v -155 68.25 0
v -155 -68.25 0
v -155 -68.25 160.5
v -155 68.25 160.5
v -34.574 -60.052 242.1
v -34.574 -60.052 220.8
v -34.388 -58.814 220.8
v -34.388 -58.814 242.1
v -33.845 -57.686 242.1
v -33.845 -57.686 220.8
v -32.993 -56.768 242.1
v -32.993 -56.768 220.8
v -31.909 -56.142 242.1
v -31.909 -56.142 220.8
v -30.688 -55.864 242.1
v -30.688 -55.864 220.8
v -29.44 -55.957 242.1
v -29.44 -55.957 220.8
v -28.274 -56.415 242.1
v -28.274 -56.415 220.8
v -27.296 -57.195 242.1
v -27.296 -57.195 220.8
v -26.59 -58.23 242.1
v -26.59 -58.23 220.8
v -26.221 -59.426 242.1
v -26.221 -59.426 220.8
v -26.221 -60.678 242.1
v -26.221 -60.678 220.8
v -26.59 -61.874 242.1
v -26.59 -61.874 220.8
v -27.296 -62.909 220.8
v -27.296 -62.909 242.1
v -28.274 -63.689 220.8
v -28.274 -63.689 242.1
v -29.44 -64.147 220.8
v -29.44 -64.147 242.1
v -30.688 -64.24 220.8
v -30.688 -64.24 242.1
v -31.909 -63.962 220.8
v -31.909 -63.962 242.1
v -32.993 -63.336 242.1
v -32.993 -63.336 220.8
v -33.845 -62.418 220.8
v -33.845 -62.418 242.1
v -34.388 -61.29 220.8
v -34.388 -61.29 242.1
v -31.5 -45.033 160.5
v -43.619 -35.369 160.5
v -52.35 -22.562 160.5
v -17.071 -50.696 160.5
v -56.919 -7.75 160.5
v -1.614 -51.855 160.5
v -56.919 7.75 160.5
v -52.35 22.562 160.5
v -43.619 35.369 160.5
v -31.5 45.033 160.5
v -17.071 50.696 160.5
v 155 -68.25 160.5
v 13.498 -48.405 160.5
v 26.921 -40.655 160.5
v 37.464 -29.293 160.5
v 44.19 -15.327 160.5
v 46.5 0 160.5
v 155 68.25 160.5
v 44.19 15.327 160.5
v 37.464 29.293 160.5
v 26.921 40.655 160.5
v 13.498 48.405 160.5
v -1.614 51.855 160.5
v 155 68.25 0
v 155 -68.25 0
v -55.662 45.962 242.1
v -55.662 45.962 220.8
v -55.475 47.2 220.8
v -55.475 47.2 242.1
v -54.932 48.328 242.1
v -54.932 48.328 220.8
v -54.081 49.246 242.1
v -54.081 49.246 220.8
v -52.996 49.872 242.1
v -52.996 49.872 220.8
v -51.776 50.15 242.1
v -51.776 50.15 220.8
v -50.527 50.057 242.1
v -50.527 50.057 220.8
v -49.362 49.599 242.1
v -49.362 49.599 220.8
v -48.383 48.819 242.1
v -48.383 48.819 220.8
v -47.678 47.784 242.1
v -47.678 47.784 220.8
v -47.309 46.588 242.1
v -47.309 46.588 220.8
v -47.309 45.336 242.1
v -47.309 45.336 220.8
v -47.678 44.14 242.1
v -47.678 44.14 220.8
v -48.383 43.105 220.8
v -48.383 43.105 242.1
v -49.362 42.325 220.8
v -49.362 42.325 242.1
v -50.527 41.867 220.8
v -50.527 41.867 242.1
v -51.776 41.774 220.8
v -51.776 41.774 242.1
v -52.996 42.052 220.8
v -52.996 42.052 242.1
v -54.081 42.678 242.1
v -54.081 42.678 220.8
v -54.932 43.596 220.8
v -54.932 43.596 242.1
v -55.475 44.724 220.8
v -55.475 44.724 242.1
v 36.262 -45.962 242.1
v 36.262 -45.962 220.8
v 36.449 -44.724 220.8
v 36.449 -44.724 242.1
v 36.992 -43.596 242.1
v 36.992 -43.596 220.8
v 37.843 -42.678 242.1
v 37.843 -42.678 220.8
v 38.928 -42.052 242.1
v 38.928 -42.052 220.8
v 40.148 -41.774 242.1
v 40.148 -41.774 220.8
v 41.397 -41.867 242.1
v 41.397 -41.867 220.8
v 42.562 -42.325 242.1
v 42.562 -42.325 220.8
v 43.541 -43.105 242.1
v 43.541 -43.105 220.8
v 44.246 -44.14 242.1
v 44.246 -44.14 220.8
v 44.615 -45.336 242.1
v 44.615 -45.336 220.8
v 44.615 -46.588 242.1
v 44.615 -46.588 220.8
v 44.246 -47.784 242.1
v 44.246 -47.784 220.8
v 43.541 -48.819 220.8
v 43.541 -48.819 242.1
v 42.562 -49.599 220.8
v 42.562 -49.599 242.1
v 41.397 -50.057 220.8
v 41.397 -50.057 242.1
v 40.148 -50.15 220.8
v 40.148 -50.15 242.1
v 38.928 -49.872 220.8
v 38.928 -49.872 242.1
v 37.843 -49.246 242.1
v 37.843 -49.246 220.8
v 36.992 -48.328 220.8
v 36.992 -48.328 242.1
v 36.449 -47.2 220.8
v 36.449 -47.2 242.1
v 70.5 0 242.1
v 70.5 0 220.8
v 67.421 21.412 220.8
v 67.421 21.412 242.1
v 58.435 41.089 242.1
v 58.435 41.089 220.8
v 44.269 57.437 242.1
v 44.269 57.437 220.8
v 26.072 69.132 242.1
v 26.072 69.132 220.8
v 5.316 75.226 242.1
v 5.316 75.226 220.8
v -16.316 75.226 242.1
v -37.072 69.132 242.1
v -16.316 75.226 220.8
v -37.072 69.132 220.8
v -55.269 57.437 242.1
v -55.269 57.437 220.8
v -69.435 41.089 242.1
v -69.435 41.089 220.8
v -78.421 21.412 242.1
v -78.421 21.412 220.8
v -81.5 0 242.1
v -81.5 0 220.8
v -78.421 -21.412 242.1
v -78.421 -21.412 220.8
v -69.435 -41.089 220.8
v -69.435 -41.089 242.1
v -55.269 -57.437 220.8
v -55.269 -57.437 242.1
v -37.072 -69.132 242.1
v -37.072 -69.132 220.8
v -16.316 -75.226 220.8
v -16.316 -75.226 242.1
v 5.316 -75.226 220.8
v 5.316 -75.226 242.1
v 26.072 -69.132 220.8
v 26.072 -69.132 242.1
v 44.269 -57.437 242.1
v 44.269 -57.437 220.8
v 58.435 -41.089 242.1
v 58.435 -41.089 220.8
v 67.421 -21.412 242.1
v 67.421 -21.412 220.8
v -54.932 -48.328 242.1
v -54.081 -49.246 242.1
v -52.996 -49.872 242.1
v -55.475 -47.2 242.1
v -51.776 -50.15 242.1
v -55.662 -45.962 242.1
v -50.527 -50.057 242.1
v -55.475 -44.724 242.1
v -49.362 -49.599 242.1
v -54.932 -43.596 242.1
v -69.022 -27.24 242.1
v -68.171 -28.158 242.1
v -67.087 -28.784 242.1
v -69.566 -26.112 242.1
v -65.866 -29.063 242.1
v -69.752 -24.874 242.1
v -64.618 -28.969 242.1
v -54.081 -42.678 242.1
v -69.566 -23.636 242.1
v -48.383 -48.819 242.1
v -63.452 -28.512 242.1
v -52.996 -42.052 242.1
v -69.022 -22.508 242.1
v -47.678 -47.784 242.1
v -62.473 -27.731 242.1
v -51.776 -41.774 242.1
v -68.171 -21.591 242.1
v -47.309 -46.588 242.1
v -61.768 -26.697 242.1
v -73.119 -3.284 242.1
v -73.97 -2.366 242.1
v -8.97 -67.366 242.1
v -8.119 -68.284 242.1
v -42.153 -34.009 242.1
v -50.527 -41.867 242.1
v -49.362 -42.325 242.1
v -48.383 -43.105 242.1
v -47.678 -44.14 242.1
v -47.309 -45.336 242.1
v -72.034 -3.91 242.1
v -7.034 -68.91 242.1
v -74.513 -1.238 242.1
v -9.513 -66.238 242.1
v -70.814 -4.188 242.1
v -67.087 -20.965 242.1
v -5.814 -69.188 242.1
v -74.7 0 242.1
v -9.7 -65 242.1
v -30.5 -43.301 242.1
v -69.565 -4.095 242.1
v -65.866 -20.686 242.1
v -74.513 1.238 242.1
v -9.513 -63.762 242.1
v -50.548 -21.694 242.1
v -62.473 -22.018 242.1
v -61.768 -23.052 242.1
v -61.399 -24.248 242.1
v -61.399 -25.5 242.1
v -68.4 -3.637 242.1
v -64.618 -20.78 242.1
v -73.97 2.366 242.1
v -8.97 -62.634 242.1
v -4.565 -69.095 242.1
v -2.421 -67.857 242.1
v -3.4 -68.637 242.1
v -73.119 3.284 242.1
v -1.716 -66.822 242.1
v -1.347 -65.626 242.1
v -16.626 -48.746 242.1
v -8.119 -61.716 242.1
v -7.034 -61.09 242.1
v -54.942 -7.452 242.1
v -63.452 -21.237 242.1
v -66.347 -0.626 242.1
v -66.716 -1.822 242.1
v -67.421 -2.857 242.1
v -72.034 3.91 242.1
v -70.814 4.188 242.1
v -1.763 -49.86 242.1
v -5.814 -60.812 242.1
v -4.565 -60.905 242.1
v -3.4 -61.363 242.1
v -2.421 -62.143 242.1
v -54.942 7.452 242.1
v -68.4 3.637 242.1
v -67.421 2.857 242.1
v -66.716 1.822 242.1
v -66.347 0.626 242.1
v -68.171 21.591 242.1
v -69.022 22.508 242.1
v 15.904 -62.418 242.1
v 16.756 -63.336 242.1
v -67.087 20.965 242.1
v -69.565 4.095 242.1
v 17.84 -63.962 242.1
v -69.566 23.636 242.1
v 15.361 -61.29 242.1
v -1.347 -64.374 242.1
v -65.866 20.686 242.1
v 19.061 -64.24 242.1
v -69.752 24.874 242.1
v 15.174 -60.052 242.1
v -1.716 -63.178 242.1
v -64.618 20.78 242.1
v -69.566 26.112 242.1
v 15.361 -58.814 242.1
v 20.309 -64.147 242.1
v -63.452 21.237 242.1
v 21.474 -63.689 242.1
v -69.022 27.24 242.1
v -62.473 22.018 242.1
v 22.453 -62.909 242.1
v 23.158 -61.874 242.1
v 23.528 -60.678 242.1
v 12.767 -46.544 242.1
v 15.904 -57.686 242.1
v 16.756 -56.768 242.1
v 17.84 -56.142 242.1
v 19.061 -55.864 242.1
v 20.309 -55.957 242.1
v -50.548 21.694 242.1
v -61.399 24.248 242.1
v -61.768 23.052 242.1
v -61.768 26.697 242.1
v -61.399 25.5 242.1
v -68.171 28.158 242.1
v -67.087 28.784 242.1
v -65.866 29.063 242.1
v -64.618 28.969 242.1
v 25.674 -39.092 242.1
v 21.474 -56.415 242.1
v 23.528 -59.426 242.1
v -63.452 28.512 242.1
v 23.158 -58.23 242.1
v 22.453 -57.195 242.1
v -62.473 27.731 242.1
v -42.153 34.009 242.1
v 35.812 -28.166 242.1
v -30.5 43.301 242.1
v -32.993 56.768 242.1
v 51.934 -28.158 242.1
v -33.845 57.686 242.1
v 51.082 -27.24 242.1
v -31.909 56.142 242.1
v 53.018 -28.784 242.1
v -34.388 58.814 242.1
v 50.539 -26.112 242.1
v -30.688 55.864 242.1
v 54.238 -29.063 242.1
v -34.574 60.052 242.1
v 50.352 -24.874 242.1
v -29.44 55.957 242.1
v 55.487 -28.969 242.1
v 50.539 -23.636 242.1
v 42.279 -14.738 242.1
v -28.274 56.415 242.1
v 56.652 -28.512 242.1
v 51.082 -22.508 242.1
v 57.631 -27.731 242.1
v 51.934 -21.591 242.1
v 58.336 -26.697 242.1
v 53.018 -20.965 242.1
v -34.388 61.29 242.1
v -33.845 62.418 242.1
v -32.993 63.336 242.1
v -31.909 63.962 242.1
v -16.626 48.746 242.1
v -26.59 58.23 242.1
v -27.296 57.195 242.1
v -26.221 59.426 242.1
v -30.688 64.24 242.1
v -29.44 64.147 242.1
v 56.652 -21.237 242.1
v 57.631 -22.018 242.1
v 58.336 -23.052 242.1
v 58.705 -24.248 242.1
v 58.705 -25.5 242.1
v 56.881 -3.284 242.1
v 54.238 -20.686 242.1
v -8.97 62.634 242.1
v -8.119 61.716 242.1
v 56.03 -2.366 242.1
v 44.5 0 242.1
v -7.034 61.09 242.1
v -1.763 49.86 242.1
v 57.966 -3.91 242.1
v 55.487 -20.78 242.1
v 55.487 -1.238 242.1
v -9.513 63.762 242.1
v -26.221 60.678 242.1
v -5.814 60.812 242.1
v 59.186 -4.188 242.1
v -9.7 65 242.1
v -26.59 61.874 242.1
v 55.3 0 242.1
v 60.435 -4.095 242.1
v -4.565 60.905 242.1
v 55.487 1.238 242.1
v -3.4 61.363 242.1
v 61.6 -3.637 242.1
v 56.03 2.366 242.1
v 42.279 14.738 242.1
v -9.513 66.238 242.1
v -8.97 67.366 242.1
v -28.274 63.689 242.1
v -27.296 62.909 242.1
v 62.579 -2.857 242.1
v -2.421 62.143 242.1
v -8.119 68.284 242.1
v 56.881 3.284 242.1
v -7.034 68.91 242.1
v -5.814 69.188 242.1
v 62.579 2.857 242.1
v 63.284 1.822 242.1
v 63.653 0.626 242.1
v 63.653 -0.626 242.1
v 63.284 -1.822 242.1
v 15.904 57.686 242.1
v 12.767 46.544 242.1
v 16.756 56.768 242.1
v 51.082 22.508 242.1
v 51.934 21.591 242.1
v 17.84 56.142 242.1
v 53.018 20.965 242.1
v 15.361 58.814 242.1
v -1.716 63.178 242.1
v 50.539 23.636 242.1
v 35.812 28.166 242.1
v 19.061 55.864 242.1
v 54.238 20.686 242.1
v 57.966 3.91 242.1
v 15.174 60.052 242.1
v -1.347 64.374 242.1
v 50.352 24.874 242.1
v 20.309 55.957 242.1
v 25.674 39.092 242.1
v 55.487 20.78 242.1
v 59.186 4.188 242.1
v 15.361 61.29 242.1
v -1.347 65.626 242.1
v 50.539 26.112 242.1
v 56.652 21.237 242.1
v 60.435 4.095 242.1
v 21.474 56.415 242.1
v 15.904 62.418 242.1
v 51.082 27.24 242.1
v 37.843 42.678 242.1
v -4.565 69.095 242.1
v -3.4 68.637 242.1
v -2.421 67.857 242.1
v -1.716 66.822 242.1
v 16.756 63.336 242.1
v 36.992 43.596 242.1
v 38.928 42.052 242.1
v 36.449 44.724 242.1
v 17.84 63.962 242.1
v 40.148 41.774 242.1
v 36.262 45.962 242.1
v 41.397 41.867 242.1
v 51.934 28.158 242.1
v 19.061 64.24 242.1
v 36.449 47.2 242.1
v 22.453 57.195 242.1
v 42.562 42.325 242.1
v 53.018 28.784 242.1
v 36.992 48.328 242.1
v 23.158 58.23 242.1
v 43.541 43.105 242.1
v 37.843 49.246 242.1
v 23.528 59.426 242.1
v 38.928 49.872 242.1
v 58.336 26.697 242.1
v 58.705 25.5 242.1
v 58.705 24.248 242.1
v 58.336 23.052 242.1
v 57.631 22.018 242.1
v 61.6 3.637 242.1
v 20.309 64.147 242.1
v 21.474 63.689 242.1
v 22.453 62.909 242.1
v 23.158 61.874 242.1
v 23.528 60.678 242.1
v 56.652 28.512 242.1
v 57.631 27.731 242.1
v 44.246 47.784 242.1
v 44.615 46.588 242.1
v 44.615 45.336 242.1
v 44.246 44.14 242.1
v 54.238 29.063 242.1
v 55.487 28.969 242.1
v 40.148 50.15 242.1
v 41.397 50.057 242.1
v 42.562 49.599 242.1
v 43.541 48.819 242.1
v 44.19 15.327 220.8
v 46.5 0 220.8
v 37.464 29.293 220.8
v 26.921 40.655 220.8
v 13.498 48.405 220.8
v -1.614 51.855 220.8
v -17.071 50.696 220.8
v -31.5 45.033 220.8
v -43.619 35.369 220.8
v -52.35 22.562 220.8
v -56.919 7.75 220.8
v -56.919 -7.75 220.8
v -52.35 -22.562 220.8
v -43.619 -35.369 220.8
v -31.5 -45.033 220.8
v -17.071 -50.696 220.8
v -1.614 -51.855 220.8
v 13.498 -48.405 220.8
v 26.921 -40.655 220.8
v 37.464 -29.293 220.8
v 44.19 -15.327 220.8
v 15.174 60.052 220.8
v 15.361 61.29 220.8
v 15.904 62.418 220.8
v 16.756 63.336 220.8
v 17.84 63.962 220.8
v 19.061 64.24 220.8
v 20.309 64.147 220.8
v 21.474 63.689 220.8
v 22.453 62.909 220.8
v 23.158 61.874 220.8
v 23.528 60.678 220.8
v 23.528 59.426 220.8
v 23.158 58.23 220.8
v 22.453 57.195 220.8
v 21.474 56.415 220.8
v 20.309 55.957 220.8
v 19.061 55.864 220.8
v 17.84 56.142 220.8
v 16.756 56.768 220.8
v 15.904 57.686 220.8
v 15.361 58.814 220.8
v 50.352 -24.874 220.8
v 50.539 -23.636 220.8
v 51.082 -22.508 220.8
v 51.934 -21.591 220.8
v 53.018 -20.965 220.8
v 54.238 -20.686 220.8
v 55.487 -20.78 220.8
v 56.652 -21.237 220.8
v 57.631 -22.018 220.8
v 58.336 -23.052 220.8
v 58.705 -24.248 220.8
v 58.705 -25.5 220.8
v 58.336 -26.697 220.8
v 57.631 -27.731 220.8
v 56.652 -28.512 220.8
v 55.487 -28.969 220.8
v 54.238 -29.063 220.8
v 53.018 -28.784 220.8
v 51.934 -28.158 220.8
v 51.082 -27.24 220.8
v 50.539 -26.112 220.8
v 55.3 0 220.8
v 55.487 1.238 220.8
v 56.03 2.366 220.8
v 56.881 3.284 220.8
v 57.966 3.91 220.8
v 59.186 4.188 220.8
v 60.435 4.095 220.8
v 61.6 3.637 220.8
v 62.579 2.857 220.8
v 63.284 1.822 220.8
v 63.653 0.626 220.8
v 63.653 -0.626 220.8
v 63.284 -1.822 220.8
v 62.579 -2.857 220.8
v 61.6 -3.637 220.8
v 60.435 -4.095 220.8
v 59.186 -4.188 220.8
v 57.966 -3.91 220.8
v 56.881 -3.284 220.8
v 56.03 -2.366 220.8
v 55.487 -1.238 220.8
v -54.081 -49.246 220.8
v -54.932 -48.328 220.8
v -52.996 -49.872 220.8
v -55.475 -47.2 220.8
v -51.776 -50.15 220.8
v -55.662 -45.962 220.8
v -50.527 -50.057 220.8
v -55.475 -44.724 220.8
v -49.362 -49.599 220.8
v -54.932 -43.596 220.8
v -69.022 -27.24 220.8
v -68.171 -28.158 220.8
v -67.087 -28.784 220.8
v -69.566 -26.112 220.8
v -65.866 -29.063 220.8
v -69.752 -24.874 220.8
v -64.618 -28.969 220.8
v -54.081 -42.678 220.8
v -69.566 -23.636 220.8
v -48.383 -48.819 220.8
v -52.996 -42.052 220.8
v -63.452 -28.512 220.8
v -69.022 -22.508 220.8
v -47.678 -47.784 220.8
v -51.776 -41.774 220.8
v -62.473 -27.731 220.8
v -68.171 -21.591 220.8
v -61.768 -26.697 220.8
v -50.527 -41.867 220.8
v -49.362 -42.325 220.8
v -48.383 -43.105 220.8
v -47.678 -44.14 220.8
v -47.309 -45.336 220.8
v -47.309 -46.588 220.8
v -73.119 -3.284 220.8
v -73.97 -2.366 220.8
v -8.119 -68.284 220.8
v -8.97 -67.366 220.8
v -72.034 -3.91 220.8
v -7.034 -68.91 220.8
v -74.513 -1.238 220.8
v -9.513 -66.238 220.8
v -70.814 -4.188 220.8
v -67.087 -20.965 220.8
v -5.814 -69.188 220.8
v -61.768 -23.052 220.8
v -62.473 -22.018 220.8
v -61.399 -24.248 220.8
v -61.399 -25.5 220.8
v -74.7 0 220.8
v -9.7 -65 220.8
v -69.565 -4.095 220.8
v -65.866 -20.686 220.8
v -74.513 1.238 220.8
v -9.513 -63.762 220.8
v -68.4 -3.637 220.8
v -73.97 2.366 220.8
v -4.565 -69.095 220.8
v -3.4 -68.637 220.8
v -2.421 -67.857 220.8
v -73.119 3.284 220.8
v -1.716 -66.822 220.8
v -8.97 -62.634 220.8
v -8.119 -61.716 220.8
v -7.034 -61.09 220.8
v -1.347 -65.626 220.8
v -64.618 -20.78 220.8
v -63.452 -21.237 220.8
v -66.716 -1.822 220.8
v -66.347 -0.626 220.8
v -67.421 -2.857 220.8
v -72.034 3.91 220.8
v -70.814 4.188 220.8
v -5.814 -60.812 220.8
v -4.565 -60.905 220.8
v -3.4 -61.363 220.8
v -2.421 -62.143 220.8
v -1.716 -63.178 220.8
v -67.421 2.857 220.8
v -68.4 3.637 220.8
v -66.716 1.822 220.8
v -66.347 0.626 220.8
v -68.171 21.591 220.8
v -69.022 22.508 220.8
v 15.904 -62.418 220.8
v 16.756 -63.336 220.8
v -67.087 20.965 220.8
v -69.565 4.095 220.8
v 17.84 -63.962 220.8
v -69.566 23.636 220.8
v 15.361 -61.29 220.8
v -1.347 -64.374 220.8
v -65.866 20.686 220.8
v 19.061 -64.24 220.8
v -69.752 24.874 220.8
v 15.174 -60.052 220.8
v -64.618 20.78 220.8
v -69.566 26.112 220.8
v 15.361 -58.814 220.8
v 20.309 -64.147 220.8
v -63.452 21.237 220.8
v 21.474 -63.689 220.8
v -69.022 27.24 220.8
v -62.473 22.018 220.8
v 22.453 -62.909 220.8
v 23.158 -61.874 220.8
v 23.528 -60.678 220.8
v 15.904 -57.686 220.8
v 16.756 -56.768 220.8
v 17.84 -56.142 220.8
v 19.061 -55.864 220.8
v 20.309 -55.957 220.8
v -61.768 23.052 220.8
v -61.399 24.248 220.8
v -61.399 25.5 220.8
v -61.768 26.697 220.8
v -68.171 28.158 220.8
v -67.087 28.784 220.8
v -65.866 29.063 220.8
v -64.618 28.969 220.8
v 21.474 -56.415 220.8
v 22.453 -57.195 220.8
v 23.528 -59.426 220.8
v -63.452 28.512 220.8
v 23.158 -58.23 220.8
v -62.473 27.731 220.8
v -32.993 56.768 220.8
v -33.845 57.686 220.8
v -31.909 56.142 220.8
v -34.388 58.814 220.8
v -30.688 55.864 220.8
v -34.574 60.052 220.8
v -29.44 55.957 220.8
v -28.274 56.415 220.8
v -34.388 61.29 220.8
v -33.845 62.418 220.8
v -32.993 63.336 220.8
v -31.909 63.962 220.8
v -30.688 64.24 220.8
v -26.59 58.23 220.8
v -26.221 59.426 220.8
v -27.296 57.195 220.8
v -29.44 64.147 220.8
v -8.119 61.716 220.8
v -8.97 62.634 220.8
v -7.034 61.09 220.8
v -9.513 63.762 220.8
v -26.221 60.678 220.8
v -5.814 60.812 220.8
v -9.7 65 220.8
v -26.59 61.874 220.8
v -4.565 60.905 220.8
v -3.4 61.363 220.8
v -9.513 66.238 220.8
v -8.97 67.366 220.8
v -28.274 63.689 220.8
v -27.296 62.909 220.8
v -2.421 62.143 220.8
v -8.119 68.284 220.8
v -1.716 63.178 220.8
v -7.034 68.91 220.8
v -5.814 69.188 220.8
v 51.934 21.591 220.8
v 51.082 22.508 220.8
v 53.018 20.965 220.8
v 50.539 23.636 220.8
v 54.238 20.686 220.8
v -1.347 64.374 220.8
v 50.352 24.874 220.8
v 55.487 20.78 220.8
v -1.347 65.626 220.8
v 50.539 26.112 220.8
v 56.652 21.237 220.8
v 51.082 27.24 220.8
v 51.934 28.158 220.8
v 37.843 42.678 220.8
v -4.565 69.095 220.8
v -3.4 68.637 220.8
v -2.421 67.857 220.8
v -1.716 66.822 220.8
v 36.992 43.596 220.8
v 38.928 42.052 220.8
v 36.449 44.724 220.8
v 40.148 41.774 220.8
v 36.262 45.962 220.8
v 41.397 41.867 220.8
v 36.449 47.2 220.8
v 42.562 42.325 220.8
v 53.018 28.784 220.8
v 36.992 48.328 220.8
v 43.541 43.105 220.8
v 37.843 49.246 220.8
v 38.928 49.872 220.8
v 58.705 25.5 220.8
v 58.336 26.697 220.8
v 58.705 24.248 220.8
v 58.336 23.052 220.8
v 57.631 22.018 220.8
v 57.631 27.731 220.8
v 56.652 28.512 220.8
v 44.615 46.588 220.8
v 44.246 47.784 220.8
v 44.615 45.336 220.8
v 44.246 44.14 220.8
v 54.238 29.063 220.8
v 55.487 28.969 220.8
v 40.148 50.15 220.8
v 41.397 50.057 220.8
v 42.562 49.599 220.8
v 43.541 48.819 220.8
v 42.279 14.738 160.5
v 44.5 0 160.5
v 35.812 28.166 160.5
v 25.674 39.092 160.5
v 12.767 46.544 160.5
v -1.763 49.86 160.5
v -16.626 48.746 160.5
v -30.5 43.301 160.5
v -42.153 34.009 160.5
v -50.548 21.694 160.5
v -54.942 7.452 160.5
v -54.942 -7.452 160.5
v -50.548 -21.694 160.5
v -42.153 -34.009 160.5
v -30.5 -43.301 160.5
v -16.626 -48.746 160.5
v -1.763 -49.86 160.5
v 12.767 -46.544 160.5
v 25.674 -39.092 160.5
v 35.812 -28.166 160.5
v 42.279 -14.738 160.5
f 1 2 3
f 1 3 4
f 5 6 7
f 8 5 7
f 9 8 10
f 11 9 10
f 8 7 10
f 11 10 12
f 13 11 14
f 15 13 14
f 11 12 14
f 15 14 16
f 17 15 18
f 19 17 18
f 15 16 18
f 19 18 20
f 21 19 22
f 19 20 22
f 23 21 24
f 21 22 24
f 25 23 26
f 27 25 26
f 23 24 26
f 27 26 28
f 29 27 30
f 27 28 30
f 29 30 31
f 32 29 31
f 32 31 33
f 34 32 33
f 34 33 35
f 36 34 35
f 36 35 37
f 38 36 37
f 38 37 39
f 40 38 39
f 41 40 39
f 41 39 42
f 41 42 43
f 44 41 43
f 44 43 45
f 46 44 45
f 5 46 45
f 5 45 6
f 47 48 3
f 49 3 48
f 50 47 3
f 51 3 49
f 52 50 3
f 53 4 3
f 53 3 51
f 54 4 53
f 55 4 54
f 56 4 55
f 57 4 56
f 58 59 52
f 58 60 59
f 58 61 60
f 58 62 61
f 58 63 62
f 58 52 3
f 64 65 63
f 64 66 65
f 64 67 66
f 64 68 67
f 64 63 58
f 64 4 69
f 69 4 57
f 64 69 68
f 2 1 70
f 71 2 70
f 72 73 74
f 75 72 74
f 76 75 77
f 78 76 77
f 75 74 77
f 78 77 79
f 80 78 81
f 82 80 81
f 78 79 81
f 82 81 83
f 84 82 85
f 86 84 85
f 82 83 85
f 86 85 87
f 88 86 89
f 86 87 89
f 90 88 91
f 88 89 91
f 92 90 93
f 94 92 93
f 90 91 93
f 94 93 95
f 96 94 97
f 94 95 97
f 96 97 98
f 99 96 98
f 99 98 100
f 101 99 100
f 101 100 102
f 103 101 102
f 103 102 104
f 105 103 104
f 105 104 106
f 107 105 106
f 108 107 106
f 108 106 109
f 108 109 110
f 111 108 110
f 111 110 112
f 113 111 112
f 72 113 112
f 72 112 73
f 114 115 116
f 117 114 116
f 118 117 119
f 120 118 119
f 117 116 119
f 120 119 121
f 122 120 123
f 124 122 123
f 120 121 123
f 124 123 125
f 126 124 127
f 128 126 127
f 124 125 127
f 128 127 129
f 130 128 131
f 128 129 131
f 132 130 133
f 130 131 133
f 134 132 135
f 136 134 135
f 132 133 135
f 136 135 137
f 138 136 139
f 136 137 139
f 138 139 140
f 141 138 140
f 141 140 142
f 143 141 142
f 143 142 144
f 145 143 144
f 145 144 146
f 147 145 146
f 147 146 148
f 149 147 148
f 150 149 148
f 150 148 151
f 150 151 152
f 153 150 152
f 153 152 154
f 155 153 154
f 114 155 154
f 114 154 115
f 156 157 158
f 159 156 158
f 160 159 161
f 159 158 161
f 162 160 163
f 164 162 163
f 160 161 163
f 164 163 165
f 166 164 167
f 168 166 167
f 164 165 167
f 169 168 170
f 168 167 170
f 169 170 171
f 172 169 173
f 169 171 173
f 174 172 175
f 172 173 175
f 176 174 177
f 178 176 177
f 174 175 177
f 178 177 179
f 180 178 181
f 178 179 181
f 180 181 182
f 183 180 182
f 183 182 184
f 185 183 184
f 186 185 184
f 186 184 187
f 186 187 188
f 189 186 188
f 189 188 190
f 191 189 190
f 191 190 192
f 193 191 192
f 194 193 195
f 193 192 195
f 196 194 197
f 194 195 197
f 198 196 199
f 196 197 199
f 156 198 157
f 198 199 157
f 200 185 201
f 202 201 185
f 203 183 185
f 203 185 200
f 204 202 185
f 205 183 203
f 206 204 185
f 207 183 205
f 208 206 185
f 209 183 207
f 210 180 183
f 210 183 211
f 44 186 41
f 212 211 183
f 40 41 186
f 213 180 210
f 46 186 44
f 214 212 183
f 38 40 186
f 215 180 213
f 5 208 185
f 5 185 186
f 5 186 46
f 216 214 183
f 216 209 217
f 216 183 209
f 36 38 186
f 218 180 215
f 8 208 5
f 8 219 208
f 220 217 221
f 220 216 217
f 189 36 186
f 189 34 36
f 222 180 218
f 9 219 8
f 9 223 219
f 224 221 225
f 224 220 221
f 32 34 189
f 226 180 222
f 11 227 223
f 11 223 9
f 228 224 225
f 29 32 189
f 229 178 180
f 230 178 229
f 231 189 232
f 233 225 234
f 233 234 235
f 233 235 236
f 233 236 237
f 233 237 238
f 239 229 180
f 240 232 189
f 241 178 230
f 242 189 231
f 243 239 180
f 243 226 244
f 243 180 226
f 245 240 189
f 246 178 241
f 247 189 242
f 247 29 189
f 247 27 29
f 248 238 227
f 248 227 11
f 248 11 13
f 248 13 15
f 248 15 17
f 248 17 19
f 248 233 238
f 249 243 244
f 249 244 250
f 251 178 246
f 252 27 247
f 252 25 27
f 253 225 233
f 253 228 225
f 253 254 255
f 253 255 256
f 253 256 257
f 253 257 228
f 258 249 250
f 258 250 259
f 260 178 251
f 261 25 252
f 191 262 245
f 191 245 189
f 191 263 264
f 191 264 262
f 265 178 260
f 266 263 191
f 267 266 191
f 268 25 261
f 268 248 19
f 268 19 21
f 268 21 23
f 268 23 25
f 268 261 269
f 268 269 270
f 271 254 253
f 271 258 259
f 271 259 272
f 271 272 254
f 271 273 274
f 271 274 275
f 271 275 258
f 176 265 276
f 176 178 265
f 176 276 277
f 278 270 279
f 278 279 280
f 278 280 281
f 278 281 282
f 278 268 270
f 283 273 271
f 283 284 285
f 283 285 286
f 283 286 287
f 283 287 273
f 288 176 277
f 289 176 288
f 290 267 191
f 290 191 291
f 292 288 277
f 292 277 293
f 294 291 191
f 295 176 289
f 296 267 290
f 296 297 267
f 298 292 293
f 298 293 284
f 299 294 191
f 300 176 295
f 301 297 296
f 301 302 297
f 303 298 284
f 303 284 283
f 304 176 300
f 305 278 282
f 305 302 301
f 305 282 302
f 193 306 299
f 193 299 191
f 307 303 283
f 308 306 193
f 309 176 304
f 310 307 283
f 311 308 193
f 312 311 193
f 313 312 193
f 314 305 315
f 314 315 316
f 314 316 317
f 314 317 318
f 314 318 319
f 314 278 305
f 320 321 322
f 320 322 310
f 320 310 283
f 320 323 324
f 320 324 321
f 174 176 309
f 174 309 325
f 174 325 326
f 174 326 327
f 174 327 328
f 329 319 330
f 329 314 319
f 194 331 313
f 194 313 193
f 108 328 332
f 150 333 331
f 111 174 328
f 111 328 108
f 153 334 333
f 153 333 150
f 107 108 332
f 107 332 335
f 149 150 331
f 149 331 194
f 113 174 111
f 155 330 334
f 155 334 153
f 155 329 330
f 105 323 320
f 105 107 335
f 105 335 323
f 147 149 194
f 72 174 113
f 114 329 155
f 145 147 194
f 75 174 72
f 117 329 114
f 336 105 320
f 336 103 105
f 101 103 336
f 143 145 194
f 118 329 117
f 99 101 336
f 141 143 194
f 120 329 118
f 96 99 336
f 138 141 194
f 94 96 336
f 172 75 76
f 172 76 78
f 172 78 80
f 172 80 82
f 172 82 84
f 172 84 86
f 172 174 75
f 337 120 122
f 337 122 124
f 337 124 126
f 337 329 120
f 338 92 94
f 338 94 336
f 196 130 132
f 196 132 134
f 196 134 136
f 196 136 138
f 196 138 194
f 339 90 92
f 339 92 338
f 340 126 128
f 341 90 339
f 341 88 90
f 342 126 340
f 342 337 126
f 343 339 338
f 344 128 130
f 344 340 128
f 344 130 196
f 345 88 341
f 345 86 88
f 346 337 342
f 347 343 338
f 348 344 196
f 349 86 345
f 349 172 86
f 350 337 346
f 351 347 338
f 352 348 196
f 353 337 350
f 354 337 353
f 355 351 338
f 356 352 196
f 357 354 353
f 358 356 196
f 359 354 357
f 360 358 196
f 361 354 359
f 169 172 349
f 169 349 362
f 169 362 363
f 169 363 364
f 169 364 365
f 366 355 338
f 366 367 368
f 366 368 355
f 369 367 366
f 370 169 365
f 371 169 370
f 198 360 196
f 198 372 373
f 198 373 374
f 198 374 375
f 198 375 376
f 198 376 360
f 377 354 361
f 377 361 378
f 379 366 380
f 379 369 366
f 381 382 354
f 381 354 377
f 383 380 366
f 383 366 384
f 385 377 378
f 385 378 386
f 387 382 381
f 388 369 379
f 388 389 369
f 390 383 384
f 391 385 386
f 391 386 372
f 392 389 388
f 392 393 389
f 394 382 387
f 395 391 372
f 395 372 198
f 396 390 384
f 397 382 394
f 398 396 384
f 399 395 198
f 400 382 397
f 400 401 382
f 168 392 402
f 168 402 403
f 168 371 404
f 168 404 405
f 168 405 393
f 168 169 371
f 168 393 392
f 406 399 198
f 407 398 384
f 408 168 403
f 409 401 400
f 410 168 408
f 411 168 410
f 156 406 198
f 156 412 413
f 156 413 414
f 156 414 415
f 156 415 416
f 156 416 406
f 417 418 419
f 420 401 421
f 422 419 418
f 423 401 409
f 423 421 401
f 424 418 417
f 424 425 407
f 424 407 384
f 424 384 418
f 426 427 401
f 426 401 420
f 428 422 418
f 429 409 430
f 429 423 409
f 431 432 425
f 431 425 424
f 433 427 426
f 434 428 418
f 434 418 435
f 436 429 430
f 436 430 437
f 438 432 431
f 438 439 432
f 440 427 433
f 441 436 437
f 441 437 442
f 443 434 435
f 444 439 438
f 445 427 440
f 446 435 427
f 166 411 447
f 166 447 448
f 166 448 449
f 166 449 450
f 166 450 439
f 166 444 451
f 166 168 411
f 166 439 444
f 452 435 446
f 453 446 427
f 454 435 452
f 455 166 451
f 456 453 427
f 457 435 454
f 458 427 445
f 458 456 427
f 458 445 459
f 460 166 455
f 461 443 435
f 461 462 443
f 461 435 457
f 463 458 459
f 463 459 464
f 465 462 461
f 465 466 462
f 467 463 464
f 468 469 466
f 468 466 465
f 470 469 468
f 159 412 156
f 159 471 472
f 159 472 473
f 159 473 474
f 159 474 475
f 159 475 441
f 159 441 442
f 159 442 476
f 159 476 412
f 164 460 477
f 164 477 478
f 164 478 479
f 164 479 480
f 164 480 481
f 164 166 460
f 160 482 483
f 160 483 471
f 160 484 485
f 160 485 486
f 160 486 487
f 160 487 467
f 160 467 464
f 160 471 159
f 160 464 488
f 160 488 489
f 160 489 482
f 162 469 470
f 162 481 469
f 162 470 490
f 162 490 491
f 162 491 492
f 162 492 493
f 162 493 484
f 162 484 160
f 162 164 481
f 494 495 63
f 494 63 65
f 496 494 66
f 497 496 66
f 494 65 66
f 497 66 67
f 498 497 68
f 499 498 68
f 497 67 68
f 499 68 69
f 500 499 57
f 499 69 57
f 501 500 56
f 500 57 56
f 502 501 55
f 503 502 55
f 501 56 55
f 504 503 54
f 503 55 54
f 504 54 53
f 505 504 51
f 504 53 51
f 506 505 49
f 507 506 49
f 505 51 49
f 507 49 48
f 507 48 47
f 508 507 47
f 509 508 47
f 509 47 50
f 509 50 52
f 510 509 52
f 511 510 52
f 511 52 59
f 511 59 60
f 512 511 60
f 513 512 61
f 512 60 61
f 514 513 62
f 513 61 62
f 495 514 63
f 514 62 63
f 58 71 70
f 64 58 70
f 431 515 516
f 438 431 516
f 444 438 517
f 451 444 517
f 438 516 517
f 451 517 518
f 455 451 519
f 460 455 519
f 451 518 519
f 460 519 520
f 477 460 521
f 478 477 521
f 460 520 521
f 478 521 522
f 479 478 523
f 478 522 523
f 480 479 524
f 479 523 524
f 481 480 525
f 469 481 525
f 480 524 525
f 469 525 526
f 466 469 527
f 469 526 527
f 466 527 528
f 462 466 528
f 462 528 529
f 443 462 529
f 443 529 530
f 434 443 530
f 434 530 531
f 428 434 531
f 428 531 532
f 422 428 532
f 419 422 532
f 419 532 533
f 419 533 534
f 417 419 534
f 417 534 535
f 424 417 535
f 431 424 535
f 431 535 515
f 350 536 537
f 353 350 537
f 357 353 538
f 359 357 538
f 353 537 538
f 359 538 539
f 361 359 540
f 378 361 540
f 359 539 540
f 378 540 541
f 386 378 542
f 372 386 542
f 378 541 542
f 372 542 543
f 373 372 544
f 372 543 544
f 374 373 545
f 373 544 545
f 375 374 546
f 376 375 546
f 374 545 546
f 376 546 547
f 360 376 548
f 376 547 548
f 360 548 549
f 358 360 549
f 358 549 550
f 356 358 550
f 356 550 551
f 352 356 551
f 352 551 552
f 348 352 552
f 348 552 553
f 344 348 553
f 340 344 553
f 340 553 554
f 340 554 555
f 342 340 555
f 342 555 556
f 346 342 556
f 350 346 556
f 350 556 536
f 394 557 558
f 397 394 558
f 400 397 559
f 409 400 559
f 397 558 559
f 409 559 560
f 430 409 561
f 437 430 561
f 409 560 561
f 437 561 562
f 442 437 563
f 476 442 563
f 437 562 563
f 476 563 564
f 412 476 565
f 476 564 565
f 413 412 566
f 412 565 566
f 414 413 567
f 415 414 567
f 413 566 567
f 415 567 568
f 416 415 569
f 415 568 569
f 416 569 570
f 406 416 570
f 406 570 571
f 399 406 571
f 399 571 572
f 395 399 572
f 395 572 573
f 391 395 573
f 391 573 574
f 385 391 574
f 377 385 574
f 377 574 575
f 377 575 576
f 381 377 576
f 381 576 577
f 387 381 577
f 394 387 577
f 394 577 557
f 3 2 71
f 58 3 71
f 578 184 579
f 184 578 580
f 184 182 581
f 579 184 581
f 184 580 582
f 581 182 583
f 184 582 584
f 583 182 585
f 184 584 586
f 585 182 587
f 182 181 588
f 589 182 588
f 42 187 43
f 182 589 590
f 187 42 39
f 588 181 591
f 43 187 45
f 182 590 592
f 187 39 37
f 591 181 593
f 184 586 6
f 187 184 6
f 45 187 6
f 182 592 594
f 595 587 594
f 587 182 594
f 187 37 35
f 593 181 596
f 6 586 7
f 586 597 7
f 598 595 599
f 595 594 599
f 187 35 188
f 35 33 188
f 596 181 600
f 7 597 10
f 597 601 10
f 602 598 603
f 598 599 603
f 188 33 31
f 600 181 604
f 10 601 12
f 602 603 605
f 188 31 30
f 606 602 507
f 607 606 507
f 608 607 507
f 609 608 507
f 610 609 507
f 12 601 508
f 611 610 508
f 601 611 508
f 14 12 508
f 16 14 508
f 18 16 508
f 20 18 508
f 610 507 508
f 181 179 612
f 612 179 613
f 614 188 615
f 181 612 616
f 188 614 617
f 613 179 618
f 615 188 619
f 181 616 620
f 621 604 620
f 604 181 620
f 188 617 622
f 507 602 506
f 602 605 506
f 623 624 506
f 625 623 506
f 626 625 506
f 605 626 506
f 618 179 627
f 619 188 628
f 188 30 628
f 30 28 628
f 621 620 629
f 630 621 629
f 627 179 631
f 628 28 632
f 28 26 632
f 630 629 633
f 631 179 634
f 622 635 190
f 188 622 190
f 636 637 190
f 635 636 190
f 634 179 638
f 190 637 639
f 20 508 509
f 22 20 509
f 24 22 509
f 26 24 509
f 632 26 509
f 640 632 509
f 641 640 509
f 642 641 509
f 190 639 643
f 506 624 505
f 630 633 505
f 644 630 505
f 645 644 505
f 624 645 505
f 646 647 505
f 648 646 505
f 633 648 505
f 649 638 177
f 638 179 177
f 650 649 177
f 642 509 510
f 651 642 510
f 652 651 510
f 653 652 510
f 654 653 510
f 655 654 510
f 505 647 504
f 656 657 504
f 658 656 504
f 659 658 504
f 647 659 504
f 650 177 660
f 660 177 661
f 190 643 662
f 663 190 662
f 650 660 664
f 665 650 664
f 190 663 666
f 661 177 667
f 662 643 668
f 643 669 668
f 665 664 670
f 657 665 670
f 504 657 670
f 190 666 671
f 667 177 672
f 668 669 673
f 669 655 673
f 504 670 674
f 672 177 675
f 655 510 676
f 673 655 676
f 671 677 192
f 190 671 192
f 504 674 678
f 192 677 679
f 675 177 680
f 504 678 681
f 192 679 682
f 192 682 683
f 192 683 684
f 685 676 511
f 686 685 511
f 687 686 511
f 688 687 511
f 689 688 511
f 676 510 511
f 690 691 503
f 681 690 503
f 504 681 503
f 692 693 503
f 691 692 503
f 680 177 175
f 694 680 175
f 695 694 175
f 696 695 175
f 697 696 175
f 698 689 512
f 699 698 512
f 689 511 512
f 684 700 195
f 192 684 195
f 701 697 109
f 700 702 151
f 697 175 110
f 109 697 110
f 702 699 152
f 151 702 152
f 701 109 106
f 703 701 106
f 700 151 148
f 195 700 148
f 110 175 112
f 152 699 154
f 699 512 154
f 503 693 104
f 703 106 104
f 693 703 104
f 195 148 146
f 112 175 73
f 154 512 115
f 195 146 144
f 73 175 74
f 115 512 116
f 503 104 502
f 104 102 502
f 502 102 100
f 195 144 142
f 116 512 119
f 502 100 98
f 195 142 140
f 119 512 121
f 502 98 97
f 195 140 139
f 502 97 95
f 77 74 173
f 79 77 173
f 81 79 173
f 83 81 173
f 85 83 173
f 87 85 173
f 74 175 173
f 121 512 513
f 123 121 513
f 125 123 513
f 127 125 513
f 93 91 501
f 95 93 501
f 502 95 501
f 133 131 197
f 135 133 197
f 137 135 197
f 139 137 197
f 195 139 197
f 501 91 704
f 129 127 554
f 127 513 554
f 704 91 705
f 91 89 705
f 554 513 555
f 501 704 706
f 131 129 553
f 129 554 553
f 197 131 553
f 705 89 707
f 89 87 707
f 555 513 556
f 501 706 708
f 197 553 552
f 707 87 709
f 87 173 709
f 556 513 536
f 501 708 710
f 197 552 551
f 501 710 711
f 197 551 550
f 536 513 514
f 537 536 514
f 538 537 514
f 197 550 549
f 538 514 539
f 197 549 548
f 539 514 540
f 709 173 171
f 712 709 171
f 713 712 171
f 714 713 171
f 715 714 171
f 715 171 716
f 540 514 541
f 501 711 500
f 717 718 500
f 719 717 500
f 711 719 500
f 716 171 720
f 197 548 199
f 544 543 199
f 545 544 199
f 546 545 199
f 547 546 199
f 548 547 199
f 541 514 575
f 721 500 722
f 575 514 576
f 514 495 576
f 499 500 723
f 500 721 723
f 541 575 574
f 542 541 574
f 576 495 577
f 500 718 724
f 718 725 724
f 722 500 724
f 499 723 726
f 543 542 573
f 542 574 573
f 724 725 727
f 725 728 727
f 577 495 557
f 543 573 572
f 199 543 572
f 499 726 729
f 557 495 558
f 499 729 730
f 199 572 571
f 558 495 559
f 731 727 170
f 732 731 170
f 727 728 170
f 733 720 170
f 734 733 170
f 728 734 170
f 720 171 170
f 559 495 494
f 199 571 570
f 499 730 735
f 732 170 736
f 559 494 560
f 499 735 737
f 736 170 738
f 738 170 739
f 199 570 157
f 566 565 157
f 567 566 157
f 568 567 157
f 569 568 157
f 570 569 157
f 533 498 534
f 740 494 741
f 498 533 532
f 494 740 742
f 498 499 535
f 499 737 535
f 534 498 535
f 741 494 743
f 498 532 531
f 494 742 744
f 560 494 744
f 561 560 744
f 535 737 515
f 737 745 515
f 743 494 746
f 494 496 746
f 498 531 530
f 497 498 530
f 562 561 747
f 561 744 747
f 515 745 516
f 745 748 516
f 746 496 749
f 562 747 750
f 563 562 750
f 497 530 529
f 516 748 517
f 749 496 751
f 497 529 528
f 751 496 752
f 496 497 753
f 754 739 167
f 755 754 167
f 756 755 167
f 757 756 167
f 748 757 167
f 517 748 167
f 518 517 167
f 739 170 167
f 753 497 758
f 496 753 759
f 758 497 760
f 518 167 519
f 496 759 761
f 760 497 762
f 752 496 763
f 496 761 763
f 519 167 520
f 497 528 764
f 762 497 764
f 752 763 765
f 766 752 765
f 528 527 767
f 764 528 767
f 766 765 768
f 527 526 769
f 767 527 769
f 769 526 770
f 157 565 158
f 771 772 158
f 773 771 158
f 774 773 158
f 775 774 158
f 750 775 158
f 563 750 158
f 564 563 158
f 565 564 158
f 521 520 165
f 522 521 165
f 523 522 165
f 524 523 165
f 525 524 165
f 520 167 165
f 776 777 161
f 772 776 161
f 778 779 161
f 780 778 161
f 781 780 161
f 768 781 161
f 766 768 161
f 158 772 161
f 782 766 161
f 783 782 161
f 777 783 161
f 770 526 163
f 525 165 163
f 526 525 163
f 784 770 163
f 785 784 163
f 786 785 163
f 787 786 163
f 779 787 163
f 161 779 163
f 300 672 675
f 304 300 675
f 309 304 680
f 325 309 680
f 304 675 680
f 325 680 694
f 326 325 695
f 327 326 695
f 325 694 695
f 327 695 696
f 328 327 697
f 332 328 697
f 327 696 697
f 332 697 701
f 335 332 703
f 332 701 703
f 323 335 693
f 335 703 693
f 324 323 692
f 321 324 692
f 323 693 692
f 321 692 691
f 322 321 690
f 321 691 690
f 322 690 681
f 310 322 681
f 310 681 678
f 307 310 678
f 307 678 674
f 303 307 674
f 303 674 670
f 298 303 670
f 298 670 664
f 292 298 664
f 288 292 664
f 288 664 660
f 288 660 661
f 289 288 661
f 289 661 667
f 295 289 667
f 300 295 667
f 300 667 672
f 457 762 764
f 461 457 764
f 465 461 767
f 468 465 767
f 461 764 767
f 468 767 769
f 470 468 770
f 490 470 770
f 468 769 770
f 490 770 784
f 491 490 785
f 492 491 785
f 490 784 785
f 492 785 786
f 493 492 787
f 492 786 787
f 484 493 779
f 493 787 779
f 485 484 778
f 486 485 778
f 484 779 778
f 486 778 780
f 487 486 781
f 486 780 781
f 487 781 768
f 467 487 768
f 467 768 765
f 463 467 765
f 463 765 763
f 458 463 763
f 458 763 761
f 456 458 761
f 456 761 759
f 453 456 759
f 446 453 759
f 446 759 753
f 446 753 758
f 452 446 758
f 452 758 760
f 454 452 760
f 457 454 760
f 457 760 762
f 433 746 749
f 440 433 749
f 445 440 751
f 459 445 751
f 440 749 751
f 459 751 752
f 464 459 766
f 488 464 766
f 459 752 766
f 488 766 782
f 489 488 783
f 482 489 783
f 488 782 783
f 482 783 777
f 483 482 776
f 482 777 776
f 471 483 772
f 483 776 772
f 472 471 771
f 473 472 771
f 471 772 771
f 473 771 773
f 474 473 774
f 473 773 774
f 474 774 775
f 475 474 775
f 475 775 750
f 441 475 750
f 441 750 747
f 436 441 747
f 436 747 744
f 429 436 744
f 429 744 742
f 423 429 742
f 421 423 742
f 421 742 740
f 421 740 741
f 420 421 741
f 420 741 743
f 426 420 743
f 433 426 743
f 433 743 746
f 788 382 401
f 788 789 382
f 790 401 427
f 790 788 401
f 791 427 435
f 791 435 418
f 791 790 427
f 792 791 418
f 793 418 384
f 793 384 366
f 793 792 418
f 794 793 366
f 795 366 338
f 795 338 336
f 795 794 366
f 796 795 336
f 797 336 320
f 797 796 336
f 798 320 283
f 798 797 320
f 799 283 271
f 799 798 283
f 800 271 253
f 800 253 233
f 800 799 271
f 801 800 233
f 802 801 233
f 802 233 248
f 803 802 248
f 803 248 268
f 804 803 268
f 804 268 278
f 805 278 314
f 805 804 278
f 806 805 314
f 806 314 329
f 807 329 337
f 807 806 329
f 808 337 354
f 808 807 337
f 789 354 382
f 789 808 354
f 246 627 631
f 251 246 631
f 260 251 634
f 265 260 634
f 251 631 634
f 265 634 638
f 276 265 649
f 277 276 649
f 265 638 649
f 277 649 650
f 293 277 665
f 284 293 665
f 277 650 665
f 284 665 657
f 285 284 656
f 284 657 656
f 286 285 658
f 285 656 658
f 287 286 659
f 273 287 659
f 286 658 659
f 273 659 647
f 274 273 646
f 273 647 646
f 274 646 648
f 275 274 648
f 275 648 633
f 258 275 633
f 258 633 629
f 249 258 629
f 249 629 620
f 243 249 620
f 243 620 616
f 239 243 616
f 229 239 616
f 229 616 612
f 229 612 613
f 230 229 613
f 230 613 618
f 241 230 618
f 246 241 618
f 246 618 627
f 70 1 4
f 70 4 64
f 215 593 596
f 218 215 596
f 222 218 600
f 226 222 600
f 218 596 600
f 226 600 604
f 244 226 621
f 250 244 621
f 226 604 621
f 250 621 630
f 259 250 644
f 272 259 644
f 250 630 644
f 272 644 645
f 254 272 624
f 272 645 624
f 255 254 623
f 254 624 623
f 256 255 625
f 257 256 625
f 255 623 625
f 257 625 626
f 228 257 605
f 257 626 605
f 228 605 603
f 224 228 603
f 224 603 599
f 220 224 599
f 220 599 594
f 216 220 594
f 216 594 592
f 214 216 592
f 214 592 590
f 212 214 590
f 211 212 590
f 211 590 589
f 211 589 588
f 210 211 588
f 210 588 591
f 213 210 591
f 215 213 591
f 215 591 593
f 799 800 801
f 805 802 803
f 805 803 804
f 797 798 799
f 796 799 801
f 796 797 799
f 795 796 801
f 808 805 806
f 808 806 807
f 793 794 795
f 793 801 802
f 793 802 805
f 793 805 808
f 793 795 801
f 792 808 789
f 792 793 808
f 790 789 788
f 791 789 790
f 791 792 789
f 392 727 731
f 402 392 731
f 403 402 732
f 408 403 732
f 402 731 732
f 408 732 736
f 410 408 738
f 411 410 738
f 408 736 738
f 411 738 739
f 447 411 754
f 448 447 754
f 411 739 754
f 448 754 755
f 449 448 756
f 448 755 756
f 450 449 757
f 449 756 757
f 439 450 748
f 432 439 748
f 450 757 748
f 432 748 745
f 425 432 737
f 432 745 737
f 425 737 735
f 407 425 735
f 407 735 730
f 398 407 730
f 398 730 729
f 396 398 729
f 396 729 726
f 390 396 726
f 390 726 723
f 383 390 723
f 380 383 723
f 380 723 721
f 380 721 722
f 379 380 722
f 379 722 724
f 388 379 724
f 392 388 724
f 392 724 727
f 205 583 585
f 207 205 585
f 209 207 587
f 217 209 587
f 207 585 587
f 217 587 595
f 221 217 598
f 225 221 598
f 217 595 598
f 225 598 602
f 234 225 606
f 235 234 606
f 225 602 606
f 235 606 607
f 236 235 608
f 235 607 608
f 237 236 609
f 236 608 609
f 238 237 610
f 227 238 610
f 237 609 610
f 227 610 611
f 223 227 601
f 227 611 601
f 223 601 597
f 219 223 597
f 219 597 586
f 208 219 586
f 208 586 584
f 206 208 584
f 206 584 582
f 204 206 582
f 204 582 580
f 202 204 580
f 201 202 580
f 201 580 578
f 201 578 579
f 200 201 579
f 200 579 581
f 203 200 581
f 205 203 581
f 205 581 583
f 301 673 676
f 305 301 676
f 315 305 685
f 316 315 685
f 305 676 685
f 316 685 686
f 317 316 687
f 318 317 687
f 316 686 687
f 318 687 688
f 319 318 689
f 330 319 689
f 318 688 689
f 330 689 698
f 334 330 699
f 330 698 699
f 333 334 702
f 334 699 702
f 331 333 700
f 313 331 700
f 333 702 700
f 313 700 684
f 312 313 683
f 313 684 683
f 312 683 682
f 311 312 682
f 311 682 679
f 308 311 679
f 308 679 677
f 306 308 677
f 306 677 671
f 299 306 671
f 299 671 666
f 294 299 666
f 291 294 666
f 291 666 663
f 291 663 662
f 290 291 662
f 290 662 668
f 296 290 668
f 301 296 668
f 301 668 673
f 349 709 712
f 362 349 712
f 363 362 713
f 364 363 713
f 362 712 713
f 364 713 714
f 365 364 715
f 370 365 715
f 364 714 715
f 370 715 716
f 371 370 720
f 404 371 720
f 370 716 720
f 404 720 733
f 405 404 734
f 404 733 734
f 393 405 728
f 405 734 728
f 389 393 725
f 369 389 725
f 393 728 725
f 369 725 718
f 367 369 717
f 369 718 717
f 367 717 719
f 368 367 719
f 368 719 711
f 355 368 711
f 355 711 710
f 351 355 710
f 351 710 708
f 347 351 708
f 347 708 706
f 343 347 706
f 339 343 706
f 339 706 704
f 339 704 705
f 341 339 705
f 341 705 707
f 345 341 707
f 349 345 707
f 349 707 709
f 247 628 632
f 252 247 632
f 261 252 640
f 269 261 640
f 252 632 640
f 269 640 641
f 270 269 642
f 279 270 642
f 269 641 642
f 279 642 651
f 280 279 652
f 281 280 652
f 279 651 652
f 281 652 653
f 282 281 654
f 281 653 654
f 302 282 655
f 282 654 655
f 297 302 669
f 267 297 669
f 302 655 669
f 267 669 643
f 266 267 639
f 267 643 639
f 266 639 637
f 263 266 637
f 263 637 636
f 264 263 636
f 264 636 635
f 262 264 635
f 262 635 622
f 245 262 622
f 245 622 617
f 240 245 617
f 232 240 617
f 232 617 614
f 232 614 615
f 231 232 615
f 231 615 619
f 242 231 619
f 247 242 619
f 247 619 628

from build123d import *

# Parameters (mm, degrees)
F0_W     = 310
F0_H     = 136.5
F1_DEPTH = 160.5
F2_R     = 52
F2_R_2   = 50
F3_DEPTH = 60.3
F4_R     = 76
F4_R_2   = 52
F4_R_3   = 50
F5_DEPTH = 21.3
F7_D     = 8.4
F7_DEPTH = 24
F7_TIP   = 2.5236145999


with BuildPart() as f1:
    # F0 (on Top) → F1 (new body)
    with BuildSketch(Plane.XY):
        Rectangle(F0_W, F0_H)
    extrude(amount=F1_DEPTH)

    # F2 (on face) → F3 (join)
    with BuildSketch(Plane.XY.offset(160.5)):
        with Locations((-5.5, 0)):
            Circle(F2_R)
        with Locations((-5.5, 0)):
            Circle(F2_R_2, mode=Mode.SUBTRACT)
    extrude(amount=F3_DEPTH)

    # F4 (on face) → F5 (join)
    with BuildSketch(Plane.XY.offset(220.8)):
        with Locations((-5.5, 0)):
            Circle(F4_R)
        with Locations((-5.5, 0)):
            Circle(F4_R_2, mode=Mode.SUBTRACT)
        with Locations((-5.5, 0)):
            Circle(F4_R_2)
        with Locations((-5.5, 0)):
            Circle(F4_R_3, mode=Mode.SUBTRACT)
    extrude(amount=F5_DEPTH)

    # F7
    with Locations(Plane.XY.offset(242.1)):
        with Locations((-5.5, 65), (19.3744231037, 60.0521696132), (40.4619407771, 45.9619407771), (54.5521696132, 24.8744231037), (59.5, 0), (54.5521696132, -24.8744231037), (40.4619407771, -45.9619407771), (19.3744231037, -60.0521696132), (-5.5, -65), (-30.3744231037, -60.0521696132), (-51.4619407771, -45.9619407771), (-65.5521696132, -24.8744231037), (-70.5, 0), (-65.5521696132, 24.8744231037), (-51.4619407771, 45.9619407771), (-30.3744231037, 60.0521696132)):
            Hole(F7_D / 2, depth=F7_DEPTH)
            with Locations((0, 0, -(F7_DEPTH + F7_TIP / 2))):  # 118° drill point
                Cone(0, F7_D / 2, F7_TIP, mode=Mode.SUBTRACT)


solid = f1.part
